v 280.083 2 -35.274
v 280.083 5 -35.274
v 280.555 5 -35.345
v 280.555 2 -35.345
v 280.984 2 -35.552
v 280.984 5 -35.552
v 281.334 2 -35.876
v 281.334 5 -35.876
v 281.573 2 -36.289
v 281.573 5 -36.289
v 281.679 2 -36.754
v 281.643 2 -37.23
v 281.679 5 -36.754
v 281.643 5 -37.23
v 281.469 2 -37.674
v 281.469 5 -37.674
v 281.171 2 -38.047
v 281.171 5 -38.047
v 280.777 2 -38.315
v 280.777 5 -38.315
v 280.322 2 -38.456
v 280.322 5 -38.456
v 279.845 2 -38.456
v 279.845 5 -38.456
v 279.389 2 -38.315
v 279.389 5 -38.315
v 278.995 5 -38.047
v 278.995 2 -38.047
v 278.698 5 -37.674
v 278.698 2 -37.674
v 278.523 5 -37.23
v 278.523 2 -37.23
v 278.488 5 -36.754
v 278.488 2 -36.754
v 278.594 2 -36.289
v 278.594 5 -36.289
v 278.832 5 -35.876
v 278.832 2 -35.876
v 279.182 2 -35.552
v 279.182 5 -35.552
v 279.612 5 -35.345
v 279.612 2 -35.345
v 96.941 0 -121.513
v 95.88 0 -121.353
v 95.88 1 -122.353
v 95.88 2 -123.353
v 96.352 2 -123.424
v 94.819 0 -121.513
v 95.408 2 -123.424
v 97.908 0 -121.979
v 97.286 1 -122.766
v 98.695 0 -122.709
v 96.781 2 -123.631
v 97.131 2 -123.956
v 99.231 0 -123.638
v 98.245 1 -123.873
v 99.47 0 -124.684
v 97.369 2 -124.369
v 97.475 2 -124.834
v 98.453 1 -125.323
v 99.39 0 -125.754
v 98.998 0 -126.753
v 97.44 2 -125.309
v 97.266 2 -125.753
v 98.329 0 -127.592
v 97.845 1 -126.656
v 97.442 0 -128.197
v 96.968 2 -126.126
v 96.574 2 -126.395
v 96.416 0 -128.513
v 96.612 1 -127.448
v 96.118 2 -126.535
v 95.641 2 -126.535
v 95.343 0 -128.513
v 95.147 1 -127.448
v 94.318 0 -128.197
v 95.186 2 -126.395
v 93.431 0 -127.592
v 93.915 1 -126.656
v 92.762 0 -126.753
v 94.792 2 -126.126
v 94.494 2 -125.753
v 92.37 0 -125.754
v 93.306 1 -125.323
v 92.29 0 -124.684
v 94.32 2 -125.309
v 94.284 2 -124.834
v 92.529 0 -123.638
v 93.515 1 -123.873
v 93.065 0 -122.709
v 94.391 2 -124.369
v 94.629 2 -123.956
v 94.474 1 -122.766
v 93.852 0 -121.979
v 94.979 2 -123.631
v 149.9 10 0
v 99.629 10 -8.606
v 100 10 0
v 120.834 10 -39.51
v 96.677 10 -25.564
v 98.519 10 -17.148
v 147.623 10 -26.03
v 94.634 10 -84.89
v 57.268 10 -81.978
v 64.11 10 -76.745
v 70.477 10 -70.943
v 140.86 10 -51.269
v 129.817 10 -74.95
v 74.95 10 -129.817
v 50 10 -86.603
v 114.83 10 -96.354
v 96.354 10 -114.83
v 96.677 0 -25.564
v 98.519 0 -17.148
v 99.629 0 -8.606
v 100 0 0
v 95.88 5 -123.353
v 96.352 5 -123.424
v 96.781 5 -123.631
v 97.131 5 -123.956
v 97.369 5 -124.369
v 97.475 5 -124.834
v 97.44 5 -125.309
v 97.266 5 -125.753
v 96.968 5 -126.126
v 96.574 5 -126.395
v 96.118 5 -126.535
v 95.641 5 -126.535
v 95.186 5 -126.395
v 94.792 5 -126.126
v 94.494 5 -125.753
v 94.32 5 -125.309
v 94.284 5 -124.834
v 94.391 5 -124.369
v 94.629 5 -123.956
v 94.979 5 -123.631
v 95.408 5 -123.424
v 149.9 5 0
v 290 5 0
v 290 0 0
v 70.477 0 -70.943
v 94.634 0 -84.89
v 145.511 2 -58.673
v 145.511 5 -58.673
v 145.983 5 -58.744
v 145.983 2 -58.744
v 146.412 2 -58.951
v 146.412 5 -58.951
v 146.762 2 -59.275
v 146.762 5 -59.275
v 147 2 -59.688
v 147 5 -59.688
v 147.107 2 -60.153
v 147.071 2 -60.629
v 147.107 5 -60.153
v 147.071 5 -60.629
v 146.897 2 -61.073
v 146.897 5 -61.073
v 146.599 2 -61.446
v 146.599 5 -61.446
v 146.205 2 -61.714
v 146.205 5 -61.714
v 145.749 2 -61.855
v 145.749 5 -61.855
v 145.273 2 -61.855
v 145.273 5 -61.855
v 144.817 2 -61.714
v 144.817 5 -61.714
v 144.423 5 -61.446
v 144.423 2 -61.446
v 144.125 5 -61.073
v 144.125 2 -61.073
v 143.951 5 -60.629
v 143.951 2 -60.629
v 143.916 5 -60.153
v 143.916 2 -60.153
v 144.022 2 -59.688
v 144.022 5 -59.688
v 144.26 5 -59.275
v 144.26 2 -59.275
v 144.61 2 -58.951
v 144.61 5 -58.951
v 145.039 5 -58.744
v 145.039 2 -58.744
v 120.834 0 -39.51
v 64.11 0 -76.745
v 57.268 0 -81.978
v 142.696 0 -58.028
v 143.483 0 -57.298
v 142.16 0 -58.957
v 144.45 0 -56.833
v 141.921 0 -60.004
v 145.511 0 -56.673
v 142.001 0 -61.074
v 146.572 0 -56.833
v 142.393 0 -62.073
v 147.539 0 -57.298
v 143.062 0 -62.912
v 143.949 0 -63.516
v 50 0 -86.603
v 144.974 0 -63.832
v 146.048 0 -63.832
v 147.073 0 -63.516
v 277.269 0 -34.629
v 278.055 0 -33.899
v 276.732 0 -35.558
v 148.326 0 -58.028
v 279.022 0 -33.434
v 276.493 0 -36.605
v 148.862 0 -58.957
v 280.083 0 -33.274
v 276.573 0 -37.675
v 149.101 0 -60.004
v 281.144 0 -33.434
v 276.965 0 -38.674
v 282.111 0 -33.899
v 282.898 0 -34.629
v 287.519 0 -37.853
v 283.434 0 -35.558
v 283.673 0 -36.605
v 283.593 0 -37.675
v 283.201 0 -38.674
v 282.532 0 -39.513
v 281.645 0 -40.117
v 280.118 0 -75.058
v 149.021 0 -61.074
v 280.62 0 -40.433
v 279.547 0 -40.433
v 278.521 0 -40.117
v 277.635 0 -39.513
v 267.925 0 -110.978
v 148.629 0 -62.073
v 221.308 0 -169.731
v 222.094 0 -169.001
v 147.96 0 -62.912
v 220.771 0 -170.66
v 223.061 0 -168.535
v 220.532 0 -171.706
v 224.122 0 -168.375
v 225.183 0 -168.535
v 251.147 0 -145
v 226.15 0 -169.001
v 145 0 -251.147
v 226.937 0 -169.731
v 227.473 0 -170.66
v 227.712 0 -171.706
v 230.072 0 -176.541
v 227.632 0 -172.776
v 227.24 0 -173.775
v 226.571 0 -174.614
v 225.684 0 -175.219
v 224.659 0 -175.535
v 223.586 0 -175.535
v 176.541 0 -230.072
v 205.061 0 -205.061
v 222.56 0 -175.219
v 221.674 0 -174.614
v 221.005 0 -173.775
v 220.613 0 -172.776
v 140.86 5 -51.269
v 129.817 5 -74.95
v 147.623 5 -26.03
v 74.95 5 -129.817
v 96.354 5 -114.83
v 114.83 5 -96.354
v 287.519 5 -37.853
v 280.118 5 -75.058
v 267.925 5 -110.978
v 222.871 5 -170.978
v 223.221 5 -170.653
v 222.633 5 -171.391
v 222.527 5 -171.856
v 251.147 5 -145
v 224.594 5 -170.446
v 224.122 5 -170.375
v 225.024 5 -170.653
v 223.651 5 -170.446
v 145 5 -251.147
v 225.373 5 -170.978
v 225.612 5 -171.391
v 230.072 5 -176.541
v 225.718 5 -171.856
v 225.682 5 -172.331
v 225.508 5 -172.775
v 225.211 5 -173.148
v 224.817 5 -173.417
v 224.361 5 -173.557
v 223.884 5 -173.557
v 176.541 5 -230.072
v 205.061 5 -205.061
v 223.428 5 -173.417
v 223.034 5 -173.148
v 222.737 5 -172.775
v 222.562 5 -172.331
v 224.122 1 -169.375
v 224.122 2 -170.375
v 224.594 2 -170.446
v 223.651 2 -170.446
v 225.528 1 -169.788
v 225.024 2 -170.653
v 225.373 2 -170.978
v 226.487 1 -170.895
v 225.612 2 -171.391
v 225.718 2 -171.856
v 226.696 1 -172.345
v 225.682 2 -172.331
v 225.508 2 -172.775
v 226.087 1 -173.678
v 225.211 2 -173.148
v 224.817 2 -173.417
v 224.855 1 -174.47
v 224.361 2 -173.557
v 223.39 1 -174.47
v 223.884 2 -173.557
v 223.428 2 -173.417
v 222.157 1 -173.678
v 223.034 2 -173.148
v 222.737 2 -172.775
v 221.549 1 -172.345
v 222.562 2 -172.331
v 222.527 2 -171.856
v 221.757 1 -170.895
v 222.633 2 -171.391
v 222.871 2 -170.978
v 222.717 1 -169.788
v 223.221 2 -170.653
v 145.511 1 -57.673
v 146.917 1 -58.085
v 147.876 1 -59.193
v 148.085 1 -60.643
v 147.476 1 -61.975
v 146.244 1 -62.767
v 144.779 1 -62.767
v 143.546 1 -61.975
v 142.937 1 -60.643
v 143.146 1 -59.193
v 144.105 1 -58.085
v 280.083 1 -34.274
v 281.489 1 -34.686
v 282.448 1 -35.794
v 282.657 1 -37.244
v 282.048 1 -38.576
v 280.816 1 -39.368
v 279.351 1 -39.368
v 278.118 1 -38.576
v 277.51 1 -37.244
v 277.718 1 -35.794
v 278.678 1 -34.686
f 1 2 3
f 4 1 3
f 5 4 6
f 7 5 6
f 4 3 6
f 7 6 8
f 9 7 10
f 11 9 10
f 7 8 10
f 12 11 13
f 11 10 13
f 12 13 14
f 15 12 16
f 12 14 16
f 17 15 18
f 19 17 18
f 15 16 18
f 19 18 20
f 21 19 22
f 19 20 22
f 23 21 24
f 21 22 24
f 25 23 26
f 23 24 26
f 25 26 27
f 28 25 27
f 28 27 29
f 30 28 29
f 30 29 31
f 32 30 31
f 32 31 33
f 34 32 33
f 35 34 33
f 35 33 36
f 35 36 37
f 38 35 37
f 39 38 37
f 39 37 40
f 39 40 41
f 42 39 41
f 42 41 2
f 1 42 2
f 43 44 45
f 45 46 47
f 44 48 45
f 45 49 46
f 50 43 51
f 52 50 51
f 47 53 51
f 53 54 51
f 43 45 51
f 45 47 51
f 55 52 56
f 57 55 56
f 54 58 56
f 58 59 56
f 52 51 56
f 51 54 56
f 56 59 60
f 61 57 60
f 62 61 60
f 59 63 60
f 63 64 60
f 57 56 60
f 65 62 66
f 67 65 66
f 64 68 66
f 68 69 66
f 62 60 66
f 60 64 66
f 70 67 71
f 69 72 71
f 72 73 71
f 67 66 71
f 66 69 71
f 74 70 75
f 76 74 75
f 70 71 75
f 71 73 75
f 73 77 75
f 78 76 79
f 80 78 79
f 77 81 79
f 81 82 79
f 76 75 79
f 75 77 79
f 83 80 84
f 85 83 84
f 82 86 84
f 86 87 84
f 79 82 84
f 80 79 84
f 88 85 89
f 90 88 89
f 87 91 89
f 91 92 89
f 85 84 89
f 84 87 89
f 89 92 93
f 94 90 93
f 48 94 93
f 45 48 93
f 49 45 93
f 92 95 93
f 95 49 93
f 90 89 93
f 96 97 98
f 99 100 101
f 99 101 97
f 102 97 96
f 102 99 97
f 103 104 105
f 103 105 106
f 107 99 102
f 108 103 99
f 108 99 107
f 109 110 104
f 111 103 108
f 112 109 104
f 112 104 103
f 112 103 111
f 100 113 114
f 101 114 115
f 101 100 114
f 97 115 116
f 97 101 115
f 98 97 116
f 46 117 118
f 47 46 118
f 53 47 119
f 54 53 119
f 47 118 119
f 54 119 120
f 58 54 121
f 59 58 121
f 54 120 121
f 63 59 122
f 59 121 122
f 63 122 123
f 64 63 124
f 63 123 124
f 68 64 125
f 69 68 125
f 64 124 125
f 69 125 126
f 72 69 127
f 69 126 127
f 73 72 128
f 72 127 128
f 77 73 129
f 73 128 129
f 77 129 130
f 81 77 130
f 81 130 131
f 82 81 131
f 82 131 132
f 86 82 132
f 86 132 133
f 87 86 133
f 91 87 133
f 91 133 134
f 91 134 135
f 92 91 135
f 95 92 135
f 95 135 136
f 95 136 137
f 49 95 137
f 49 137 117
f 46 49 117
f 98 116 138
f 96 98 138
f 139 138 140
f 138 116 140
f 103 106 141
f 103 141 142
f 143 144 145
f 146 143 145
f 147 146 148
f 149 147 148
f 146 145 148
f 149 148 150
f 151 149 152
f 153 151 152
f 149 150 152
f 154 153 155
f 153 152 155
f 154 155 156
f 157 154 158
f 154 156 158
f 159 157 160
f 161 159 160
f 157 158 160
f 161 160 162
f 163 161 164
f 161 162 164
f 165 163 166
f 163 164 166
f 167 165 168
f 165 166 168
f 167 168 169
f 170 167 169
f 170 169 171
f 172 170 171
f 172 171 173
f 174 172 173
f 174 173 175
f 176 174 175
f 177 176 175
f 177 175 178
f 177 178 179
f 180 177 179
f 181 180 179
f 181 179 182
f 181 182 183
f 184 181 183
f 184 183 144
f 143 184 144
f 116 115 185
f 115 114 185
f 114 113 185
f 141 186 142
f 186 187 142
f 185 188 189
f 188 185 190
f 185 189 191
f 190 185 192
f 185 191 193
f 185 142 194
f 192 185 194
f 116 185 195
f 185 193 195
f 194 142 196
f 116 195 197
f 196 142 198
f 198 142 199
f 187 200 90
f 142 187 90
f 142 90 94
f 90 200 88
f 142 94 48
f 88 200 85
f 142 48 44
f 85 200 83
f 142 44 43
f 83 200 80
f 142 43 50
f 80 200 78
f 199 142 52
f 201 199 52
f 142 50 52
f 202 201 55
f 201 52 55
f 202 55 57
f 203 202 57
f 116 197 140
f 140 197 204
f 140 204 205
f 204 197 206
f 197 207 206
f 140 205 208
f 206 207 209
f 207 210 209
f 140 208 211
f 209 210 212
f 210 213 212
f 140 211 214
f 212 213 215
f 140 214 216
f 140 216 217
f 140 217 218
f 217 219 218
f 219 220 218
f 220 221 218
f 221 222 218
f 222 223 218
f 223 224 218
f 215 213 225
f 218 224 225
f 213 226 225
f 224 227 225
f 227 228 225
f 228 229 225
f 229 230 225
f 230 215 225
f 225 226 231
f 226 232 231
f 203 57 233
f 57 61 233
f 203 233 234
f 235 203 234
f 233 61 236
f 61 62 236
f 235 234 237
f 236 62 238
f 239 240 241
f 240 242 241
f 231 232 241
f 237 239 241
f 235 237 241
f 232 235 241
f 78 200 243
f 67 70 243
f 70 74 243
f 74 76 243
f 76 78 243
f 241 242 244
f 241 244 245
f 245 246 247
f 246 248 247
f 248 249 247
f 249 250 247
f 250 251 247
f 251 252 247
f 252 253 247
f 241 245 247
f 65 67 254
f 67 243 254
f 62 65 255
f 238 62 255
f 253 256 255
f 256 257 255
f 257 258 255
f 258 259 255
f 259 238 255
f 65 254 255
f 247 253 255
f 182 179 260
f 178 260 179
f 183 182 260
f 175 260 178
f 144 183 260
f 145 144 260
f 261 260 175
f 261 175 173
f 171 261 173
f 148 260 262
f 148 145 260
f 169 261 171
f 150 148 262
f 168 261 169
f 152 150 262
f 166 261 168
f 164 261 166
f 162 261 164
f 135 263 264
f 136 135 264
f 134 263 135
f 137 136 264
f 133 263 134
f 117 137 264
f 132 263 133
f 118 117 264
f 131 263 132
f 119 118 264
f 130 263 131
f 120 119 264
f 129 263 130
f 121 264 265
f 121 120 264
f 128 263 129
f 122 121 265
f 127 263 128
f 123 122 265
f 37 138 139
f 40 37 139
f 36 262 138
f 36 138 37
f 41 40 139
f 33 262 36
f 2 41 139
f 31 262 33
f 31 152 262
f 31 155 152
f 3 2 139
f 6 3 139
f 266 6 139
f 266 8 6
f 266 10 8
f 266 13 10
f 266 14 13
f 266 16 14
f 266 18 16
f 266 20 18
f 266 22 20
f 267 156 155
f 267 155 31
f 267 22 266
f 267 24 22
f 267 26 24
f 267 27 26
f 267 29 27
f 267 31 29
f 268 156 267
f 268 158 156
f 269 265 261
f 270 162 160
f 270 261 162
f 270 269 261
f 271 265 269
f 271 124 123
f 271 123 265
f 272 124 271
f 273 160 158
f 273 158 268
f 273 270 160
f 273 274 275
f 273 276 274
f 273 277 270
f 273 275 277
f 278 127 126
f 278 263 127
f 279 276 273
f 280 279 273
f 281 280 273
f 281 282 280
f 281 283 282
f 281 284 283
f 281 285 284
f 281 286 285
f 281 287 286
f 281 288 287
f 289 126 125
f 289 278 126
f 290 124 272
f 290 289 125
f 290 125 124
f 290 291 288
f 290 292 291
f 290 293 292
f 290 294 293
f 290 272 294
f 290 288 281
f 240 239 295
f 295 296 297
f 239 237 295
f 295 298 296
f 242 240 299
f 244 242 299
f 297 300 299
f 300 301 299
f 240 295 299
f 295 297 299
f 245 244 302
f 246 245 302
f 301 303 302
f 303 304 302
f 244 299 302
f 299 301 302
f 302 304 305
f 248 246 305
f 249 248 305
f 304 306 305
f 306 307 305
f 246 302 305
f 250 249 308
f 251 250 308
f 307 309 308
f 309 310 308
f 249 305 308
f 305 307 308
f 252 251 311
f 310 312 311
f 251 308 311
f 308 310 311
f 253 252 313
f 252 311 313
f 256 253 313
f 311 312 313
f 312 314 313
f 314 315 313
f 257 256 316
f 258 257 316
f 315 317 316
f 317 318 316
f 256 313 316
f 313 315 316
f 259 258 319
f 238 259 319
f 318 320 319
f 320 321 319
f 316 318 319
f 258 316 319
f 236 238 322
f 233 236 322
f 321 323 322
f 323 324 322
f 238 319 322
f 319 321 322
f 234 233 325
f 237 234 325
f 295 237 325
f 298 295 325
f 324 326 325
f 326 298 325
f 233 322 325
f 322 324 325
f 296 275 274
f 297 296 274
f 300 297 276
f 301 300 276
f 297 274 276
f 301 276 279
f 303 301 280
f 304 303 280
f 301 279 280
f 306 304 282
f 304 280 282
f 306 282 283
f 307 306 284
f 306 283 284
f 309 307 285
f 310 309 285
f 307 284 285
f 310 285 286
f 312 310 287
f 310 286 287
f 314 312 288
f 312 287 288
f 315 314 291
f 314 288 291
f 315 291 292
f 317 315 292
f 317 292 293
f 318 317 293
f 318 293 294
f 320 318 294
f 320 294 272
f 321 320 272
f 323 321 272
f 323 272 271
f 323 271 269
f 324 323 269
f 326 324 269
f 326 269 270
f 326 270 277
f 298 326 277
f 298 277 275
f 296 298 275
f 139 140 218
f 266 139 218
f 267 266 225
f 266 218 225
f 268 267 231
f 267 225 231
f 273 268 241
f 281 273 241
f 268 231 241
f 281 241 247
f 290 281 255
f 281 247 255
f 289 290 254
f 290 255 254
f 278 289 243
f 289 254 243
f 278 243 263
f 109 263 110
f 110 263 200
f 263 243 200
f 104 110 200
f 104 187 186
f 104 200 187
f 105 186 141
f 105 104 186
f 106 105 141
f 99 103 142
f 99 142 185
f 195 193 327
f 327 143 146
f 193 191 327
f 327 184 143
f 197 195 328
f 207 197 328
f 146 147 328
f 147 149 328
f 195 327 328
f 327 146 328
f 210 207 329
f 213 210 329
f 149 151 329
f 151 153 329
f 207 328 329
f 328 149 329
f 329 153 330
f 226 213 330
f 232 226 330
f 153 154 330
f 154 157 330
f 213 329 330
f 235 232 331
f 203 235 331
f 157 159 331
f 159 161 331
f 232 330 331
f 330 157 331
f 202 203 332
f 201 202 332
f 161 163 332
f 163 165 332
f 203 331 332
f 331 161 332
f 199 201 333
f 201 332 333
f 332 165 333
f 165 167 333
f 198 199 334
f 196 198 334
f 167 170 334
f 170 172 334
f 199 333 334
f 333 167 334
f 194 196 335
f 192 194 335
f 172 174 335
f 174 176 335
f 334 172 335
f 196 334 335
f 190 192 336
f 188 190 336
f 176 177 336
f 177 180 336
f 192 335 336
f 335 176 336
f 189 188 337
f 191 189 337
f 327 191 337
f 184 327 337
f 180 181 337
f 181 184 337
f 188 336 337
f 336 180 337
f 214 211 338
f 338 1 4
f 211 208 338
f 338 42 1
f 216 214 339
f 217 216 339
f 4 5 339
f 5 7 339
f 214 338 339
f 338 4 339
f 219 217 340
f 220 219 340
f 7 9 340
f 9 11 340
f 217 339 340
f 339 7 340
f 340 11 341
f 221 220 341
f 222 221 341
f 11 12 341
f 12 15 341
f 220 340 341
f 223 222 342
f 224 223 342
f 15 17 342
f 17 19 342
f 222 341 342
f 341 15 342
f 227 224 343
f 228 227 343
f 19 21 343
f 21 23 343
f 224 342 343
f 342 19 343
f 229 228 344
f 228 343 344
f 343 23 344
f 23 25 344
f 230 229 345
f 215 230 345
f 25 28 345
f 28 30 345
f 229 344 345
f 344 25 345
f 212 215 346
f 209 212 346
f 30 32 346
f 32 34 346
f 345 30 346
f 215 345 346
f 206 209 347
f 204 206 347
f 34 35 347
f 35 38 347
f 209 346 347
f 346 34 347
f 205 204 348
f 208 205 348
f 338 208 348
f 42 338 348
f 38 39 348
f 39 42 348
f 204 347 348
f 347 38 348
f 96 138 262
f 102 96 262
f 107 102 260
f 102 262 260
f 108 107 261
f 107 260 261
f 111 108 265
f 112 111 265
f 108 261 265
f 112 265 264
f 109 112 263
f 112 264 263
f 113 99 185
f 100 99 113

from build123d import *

# Parameters (mm, degrees)
AUFSATZ_LINEAR_AUSTRAGEN1_DEPTH = 5
AUFSATZ_LINEAR_AUSTRAGEN2_DEPTH = 5
SCHNITT_LINEAR_AUSTRAGEN1_DEPTH = 384.76425055
SCHNITT_LINEAR_AUSTRAGEN2_DEPTH = 384.76425055
SKIZZE5_R                       = 1.6
SCHNITT_LINEAR_AUSTRAGEN3_DEPTH = 384.666521865
FASE1_SIZE                      = 2


with BuildPart() as part:
    # Skizze1 → Aufsatz-Linear austragen1 (new body)
    with BuildSketch(Plane(origin=(0, 0, 0), x_dir=(1, 0, 0), z_dir=(0, 1, 0))):
        with BuildLine():
            Line((0, 0), (290, 0))
            ThreePointArc((290, 0), (251.147367097, 145), (145, 251.147367097))
            Line((145, 251.147367097), (0, 0))
        make_face()
    extrude(amount=AUFSATZ_LINEAR_AUSTRAGEN1_DEPTH)

    # Skizze2 → Aufsatz-Linear austragen2 (add)
    with BuildSketch(Plane(origin=(0, 5, 0), x_dir=(1, 0, 0), z_dir=(0, 1, 0))):
        with BuildLine():
            Line((0, 0), (149.9, 0))
            ThreePointArc((149.9, 0), (129.817208027, 74.95), (74.95, 129.817208027))
            Line((74.95, 129.817208027), (0, 0))
        make_face()
    extrude(amount=AUFSATZ_LINEAR_AUSTRAGEN2_DEPTH)

    # Skizze3 → Schnitt-Linear austragen1 (cut, through all)
    with BuildSketch(Plane(origin=(0, 10, 0), x_dir=(1, 0, 0), z_dir=(0, 1, 0))):
        Polygon((26.2, 45.379731158), (94.633560231, 84.889865579), (120.833560231, 39.510134421), (52.4, 0), (0, 0), align=None)
    extrude(amount=-SCHNITT_LINEAR_AUSTRAGEN1_DEPTH, mode=Mode.SUBTRACT)

    # Skizze4 → Schnitt-Linear austragen2 (cut, through all)
    with BuildSketch(Plane(origin=(0, 10, 0), x_dir=(1, 0, 0), z_dir=(0, 1, 0))):
        with BuildLine():
            Line((100, 0), (0, 0))
            Line((0, 0), (50, 86.602540378))
            ThreePointArc((50, 86.602540378), (86.602540378, 50), (100, 0))
        make_face()
    extrude(amount=-SCHNITT_LINEAR_AUSTRAGEN2_DEPTH, mode=Mode.SUBTRACT)

    # Skizze5 → Schnitt-Linear austragen3 (cut, through all)
    with BuildSketch(Plane(origin=(0, 5, 0), x_dir=(1, 0, 0), z_dir=(0, 1, 0))):
        with Locations(Location((95.879925069, 124.953151096, 0), (0, 0, 270))):
            Circle(SKIZZE5_R)
        with Locations(Location((224.122318632, 171.975103695, 0), (0, 0, 270))):
            Circle(SKIZZE5_R)
        with Locations(Location((145.511026371, 60.272640598, 0), (0, 0, 270))):
            Circle(SKIZZE5_R)
        with Locations(Location((280.083173338, 36.873649302, 0), (0, 0, 270))):
            Circle(SKIZZE5_R)
    extrude(amount=-SCHNITT_LINEAR_AUSTRAGEN3_DEPTH, mode=Mode.SUBTRACT)

    # Fase1
    fase1_edges = [part.edges().sort_by_distance(p)[0] for p in [
        (95.879925069, 0, -126.553151096),
        (224.122318632, 0, -173.575103695),
        (145.511026371, 0, -61.872640598),
        (280.083173338, 0, -38.473649302),
    ]]
    chamfer(fase1_edges, length=FASE1_SIZE)


solid = part.part
